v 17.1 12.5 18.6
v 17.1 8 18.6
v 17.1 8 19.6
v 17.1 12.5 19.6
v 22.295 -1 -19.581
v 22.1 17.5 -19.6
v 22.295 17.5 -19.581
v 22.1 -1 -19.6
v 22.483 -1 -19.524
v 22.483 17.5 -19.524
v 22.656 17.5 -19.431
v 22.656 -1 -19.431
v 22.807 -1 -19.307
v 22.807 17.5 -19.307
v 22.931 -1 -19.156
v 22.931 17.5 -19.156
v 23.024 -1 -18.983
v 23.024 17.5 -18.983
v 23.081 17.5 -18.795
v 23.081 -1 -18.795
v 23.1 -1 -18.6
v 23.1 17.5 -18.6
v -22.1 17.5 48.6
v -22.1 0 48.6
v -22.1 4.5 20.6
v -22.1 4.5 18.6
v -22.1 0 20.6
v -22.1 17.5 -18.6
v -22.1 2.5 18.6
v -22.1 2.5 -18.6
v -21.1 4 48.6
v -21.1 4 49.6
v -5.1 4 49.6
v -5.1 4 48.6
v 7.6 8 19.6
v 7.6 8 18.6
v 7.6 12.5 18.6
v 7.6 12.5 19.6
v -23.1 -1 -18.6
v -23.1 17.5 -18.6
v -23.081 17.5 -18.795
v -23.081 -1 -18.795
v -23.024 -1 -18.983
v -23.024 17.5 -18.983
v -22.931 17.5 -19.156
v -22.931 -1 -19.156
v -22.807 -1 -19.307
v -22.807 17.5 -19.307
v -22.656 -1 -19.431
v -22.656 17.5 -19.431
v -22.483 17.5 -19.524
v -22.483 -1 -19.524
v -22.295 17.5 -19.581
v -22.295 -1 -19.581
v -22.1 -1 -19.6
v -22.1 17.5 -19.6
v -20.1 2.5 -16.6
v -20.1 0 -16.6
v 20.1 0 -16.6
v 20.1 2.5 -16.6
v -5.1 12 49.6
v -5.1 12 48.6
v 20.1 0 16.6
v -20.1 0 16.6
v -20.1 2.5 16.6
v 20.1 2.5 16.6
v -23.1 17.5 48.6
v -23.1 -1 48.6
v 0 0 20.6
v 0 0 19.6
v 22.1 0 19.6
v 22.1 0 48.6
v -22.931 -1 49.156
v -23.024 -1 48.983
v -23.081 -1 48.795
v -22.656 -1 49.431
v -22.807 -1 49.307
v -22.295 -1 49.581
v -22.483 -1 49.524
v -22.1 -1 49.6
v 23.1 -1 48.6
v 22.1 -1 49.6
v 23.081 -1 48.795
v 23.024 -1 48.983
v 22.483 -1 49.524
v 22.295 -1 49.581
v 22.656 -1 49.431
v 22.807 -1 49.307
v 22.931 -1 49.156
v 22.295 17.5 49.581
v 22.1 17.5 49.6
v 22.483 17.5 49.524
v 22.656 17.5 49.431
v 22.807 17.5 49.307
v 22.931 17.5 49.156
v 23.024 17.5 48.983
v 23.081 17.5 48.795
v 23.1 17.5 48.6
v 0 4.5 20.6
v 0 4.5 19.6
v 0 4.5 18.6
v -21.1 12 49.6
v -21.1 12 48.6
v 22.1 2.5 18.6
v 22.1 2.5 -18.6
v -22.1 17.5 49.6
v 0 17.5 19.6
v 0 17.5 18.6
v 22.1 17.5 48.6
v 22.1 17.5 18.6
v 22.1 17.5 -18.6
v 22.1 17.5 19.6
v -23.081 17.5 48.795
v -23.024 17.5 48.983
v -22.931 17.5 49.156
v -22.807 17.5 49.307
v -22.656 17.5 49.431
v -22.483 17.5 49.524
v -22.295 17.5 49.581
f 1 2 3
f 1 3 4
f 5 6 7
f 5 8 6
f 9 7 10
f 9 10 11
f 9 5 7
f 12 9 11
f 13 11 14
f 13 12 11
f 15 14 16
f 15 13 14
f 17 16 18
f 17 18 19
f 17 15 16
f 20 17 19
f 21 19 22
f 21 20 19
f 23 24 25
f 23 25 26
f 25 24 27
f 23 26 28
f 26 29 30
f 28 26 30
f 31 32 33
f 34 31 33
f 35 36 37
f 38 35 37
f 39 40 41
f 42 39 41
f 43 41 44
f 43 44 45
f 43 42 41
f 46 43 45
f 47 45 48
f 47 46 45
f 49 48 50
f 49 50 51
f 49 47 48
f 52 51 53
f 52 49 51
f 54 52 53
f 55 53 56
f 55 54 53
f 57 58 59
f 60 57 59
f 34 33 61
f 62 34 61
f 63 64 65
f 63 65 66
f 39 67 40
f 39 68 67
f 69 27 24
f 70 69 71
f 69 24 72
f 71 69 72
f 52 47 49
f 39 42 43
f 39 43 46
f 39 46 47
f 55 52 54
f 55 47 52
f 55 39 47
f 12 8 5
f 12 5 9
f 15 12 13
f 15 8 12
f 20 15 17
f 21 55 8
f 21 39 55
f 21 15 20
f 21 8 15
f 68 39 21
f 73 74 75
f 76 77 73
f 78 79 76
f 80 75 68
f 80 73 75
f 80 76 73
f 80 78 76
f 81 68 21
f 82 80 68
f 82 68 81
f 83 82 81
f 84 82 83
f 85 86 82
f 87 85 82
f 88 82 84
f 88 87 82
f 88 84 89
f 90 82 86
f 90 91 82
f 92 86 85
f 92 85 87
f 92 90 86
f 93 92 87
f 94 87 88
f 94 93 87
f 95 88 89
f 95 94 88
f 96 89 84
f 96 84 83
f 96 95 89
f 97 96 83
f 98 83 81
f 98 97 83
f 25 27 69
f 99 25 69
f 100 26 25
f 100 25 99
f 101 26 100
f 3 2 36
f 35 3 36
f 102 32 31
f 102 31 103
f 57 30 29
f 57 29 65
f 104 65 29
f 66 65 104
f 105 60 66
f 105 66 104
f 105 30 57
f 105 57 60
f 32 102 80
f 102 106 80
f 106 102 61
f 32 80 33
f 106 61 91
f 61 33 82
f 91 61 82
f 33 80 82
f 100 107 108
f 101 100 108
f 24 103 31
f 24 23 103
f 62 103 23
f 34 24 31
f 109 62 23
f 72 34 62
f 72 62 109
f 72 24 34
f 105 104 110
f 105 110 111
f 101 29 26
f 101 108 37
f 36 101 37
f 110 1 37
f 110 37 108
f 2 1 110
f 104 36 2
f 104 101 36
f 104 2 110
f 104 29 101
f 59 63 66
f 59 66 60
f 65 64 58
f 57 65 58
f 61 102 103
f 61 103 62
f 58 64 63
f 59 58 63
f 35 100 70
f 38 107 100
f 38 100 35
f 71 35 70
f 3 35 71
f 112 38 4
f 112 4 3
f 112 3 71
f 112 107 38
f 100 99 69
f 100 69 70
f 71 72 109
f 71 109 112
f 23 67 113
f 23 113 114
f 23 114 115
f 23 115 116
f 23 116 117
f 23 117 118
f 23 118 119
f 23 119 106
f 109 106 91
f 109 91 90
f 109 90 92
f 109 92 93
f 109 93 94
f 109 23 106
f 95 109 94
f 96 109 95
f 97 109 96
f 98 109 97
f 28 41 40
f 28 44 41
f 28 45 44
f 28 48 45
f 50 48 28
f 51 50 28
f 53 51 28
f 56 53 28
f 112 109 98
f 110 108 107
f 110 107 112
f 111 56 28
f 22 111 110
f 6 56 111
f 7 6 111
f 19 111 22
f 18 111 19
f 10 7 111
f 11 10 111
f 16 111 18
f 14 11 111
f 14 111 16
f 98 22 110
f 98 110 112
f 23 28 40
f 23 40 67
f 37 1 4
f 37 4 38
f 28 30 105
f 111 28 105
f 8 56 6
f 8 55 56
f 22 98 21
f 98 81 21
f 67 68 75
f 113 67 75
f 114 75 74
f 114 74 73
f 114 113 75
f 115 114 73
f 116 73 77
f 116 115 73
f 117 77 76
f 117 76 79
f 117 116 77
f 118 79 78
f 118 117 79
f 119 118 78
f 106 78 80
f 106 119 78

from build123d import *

# Parameters (mm, degrees)
SKETCH1_W           = 46.2
SKETCH1_H           = 39.2
SKETCH1_W_2         = 40.2
SKETCH1_H_2         = 33.2
BOSS_EXTRUDE1_DEPTH = 2.5
SKETCH3_W           = 46.2
SKETCH3_H           = 39.2
BOSS_EXTRUDE2_DEPTH = 1
SKETCH4_W           = 46.2
SKETCH4_H           = 39.2
SKETCH4_W_2         = 44.2
SKETCH4_H_2         = 37.2
BOSS_EXTRUDE3_DEPTH = 15
SKETCH5_W           = 9.5
SKETCH5_H           = 4.5
CUT_EXTRUDE1_DEPTH  = 15
SKETCH6_W           = 46.2
SKETCH6_H           = 30
BOSS_EXTRUDE4_DEPTH = 1
SKETCH7_W           = 46.2
SKETCH7_H           = 30
SKETCH7_W_2         = 44.2
SKETCH7_H_2         = 28
BOSS_EXTRUDE5_DEPTH = 17.5
SKETCH8_W           = 22.1
SKETCH8_H           = 2
CUT_EXTRUDE2_DEPTH  = 13
SKETCH9_W           = 22.1
SKETCH9_H           = 1
CUT_EXTRUDE3_DEPTH  = 17.5
SKETCH10_W          = 16
SKETCH10_H          = 8
CUT_EXTRUDE4_DEPTH  = 10
FILLET1_R           = 1


with BuildPart() as part:
    # Sketch1 → Boss-Extrude1 (new body)
    with BuildSketch(Plane(origin=(0, 0, 0), x_dir=(1, 0, 0), z_dir=(0, 1, 0))):
        Rectangle(SKETCH1_W, SKETCH1_H)
        Rectangle(SKETCH1_W_2, SKETCH1_H_2, mode=Mode.SUBTRACT)
    extrude(amount=BOSS_EXTRUDE1_DEPTH)

    # Sketch3 → Boss-Extrude2 (add)
    with BuildSketch(Plane.XZ):
        Rectangle(SKETCH3_W, SKETCH3_H)
    extrude(amount=BOSS_EXTRUDE2_DEPTH)

    # Sketch4 → Boss-Extrude3 (add)
    with BuildSketch(Plane(origin=(0, 2.5, 0), x_dir=(1, 0, 0), z_dir=(0, 1, 0))):
        Rectangle(SKETCH4_W, SKETCH4_H)
        Rectangle(SKETCH4_W_2, SKETCH4_H_2, mode=Mode.SUBTRACT)
    extrude(amount=BOSS_EXTRUDE3_DEPTH)

    # Sketch5 → Cut-Extrude1 (cut)
    with BuildSketch(Plane(origin=(0, 0, 18.6), x_dir=(-1, 0, 0), z_dir=(0, 0, -1))):
        with Locations((-12.35, 10.25)):
            Rectangle(SKETCH5_W, SKETCH5_H)
    extrude(amount=-CUT_EXTRUDE1_DEPTH, mode=Mode.SUBTRACT)

    # Sketch6 → Boss-Extrude4 (add)
    with BuildSketch(Plane.XZ.offset(1)):
        with Locations((0, 34.6)):
            Rectangle(SKETCH6_W, SKETCH6_H)
    extrude(amount=-BOSS_EXTRUDE4_DEPTH)

    # Sketch7 → Boss-Extrude5 (add)
    with BuildSketch(Plane(origin=(0, 0, 0), x_dir=(1, 0, 0), z_dir=(0, 1, 0))):
        with Locations((0, -34.6)):
            Rectangle(SKETCH7_W, SKETCH7_H)
        with Locations((0, -34.6)):
            Rectangle(SKETCH7_W_2, SKETCH7_H_2, mode=Mode.SUBTRACT)
    extrude(amount=BOSS_EXTRUDE5_DEPTH)

    # Sketch8 → Cut-Extrude2 (cut)
    with BuildSketch(Plane(origin=(0, 17.5, 0), x_dir=(1, 0, 0), z_dir=(0, 1, 0))):
        with Locations((-11.05, -19.6)):
            Rectangle(SKETCH8_W, SKETCH8_H)
    extrude(amount=-CUT_EXTRUDE2_DEPTH, mode=Mode.SUBTRACT)

    # Sketch9 → Cut-Extrude3 (cut)
    with BuildSketch(Plane(origin=(0, 17.5, 0), x_dir=(1, 0, 0), z_dir=(0, 1, 0))):
        with Locations((11.05, -20.1)):
            Rectangle(SKETCH9_W, SKETCH9_H)
    extrude(amount=-CUT_EXTRUDE3_DEPTH, mode=Mode.SUBTRACT)

    # Sketch10 → Cut-Extrude4 (cut)
    with BuildSketch(Plane.XY.offset(49.6)):
        with Locations((-13.1, 8)):
            Rectangle(SKETCH10_W, SKETCH10_H)
    extrude(amount=-CUT_EXTRUDE4_DEPTH, mode=Mode.SUBTRACT)

    # Fillet1
    fillet1_edges = [part.edges().sort_by_distance(p)[0] for p in [
        (-23.1, 8.25, -19.6),
        (23.1, 8.25, -19.6),
        (-23.1, 8.25, 49.6),
        (23.1, 8.25, 49.6),
    ]]
    fillet(fillet1_edges, radius=FILLET1_R)


solid = part.part
